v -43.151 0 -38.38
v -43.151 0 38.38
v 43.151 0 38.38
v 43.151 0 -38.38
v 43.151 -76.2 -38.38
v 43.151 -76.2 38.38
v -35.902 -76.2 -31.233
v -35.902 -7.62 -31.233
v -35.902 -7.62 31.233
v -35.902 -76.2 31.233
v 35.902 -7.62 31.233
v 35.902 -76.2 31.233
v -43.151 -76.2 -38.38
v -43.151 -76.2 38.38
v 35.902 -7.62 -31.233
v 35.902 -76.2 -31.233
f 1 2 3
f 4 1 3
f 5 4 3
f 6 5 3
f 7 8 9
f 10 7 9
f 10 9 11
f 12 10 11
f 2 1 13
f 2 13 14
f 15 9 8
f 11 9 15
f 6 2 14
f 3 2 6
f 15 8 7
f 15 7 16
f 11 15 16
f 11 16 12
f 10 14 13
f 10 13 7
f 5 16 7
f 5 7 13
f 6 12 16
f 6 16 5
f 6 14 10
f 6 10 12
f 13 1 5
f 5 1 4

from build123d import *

# Parameters (mm, degrees)
F0_W     = 71.80331
F0_H     = 62.466614
F1_DEPTH = 7.62
F0_W_2   = 86.302102
F0_H_2   = 76.759144
F2_DEPTH = 76.2


with BuildPart() as f1:
    # F0 (on Front) → F1 (new body)
    with BuildSketch(Plane.XZ):
        Rectangle(F0_W, F0_H)
    extrude(amount=F1_DEPTH)

    # F0 (on Front) → F2 (join)
    with BuildSketch(Plane.XZ):
        Rectangle(F0_W_2, F0_H_2)
        Rectangle(F0_W, F0_H, mode=Mode.SUBTRACT)
    extrude(amount=F2_DEPTH)


solid = f1.part
